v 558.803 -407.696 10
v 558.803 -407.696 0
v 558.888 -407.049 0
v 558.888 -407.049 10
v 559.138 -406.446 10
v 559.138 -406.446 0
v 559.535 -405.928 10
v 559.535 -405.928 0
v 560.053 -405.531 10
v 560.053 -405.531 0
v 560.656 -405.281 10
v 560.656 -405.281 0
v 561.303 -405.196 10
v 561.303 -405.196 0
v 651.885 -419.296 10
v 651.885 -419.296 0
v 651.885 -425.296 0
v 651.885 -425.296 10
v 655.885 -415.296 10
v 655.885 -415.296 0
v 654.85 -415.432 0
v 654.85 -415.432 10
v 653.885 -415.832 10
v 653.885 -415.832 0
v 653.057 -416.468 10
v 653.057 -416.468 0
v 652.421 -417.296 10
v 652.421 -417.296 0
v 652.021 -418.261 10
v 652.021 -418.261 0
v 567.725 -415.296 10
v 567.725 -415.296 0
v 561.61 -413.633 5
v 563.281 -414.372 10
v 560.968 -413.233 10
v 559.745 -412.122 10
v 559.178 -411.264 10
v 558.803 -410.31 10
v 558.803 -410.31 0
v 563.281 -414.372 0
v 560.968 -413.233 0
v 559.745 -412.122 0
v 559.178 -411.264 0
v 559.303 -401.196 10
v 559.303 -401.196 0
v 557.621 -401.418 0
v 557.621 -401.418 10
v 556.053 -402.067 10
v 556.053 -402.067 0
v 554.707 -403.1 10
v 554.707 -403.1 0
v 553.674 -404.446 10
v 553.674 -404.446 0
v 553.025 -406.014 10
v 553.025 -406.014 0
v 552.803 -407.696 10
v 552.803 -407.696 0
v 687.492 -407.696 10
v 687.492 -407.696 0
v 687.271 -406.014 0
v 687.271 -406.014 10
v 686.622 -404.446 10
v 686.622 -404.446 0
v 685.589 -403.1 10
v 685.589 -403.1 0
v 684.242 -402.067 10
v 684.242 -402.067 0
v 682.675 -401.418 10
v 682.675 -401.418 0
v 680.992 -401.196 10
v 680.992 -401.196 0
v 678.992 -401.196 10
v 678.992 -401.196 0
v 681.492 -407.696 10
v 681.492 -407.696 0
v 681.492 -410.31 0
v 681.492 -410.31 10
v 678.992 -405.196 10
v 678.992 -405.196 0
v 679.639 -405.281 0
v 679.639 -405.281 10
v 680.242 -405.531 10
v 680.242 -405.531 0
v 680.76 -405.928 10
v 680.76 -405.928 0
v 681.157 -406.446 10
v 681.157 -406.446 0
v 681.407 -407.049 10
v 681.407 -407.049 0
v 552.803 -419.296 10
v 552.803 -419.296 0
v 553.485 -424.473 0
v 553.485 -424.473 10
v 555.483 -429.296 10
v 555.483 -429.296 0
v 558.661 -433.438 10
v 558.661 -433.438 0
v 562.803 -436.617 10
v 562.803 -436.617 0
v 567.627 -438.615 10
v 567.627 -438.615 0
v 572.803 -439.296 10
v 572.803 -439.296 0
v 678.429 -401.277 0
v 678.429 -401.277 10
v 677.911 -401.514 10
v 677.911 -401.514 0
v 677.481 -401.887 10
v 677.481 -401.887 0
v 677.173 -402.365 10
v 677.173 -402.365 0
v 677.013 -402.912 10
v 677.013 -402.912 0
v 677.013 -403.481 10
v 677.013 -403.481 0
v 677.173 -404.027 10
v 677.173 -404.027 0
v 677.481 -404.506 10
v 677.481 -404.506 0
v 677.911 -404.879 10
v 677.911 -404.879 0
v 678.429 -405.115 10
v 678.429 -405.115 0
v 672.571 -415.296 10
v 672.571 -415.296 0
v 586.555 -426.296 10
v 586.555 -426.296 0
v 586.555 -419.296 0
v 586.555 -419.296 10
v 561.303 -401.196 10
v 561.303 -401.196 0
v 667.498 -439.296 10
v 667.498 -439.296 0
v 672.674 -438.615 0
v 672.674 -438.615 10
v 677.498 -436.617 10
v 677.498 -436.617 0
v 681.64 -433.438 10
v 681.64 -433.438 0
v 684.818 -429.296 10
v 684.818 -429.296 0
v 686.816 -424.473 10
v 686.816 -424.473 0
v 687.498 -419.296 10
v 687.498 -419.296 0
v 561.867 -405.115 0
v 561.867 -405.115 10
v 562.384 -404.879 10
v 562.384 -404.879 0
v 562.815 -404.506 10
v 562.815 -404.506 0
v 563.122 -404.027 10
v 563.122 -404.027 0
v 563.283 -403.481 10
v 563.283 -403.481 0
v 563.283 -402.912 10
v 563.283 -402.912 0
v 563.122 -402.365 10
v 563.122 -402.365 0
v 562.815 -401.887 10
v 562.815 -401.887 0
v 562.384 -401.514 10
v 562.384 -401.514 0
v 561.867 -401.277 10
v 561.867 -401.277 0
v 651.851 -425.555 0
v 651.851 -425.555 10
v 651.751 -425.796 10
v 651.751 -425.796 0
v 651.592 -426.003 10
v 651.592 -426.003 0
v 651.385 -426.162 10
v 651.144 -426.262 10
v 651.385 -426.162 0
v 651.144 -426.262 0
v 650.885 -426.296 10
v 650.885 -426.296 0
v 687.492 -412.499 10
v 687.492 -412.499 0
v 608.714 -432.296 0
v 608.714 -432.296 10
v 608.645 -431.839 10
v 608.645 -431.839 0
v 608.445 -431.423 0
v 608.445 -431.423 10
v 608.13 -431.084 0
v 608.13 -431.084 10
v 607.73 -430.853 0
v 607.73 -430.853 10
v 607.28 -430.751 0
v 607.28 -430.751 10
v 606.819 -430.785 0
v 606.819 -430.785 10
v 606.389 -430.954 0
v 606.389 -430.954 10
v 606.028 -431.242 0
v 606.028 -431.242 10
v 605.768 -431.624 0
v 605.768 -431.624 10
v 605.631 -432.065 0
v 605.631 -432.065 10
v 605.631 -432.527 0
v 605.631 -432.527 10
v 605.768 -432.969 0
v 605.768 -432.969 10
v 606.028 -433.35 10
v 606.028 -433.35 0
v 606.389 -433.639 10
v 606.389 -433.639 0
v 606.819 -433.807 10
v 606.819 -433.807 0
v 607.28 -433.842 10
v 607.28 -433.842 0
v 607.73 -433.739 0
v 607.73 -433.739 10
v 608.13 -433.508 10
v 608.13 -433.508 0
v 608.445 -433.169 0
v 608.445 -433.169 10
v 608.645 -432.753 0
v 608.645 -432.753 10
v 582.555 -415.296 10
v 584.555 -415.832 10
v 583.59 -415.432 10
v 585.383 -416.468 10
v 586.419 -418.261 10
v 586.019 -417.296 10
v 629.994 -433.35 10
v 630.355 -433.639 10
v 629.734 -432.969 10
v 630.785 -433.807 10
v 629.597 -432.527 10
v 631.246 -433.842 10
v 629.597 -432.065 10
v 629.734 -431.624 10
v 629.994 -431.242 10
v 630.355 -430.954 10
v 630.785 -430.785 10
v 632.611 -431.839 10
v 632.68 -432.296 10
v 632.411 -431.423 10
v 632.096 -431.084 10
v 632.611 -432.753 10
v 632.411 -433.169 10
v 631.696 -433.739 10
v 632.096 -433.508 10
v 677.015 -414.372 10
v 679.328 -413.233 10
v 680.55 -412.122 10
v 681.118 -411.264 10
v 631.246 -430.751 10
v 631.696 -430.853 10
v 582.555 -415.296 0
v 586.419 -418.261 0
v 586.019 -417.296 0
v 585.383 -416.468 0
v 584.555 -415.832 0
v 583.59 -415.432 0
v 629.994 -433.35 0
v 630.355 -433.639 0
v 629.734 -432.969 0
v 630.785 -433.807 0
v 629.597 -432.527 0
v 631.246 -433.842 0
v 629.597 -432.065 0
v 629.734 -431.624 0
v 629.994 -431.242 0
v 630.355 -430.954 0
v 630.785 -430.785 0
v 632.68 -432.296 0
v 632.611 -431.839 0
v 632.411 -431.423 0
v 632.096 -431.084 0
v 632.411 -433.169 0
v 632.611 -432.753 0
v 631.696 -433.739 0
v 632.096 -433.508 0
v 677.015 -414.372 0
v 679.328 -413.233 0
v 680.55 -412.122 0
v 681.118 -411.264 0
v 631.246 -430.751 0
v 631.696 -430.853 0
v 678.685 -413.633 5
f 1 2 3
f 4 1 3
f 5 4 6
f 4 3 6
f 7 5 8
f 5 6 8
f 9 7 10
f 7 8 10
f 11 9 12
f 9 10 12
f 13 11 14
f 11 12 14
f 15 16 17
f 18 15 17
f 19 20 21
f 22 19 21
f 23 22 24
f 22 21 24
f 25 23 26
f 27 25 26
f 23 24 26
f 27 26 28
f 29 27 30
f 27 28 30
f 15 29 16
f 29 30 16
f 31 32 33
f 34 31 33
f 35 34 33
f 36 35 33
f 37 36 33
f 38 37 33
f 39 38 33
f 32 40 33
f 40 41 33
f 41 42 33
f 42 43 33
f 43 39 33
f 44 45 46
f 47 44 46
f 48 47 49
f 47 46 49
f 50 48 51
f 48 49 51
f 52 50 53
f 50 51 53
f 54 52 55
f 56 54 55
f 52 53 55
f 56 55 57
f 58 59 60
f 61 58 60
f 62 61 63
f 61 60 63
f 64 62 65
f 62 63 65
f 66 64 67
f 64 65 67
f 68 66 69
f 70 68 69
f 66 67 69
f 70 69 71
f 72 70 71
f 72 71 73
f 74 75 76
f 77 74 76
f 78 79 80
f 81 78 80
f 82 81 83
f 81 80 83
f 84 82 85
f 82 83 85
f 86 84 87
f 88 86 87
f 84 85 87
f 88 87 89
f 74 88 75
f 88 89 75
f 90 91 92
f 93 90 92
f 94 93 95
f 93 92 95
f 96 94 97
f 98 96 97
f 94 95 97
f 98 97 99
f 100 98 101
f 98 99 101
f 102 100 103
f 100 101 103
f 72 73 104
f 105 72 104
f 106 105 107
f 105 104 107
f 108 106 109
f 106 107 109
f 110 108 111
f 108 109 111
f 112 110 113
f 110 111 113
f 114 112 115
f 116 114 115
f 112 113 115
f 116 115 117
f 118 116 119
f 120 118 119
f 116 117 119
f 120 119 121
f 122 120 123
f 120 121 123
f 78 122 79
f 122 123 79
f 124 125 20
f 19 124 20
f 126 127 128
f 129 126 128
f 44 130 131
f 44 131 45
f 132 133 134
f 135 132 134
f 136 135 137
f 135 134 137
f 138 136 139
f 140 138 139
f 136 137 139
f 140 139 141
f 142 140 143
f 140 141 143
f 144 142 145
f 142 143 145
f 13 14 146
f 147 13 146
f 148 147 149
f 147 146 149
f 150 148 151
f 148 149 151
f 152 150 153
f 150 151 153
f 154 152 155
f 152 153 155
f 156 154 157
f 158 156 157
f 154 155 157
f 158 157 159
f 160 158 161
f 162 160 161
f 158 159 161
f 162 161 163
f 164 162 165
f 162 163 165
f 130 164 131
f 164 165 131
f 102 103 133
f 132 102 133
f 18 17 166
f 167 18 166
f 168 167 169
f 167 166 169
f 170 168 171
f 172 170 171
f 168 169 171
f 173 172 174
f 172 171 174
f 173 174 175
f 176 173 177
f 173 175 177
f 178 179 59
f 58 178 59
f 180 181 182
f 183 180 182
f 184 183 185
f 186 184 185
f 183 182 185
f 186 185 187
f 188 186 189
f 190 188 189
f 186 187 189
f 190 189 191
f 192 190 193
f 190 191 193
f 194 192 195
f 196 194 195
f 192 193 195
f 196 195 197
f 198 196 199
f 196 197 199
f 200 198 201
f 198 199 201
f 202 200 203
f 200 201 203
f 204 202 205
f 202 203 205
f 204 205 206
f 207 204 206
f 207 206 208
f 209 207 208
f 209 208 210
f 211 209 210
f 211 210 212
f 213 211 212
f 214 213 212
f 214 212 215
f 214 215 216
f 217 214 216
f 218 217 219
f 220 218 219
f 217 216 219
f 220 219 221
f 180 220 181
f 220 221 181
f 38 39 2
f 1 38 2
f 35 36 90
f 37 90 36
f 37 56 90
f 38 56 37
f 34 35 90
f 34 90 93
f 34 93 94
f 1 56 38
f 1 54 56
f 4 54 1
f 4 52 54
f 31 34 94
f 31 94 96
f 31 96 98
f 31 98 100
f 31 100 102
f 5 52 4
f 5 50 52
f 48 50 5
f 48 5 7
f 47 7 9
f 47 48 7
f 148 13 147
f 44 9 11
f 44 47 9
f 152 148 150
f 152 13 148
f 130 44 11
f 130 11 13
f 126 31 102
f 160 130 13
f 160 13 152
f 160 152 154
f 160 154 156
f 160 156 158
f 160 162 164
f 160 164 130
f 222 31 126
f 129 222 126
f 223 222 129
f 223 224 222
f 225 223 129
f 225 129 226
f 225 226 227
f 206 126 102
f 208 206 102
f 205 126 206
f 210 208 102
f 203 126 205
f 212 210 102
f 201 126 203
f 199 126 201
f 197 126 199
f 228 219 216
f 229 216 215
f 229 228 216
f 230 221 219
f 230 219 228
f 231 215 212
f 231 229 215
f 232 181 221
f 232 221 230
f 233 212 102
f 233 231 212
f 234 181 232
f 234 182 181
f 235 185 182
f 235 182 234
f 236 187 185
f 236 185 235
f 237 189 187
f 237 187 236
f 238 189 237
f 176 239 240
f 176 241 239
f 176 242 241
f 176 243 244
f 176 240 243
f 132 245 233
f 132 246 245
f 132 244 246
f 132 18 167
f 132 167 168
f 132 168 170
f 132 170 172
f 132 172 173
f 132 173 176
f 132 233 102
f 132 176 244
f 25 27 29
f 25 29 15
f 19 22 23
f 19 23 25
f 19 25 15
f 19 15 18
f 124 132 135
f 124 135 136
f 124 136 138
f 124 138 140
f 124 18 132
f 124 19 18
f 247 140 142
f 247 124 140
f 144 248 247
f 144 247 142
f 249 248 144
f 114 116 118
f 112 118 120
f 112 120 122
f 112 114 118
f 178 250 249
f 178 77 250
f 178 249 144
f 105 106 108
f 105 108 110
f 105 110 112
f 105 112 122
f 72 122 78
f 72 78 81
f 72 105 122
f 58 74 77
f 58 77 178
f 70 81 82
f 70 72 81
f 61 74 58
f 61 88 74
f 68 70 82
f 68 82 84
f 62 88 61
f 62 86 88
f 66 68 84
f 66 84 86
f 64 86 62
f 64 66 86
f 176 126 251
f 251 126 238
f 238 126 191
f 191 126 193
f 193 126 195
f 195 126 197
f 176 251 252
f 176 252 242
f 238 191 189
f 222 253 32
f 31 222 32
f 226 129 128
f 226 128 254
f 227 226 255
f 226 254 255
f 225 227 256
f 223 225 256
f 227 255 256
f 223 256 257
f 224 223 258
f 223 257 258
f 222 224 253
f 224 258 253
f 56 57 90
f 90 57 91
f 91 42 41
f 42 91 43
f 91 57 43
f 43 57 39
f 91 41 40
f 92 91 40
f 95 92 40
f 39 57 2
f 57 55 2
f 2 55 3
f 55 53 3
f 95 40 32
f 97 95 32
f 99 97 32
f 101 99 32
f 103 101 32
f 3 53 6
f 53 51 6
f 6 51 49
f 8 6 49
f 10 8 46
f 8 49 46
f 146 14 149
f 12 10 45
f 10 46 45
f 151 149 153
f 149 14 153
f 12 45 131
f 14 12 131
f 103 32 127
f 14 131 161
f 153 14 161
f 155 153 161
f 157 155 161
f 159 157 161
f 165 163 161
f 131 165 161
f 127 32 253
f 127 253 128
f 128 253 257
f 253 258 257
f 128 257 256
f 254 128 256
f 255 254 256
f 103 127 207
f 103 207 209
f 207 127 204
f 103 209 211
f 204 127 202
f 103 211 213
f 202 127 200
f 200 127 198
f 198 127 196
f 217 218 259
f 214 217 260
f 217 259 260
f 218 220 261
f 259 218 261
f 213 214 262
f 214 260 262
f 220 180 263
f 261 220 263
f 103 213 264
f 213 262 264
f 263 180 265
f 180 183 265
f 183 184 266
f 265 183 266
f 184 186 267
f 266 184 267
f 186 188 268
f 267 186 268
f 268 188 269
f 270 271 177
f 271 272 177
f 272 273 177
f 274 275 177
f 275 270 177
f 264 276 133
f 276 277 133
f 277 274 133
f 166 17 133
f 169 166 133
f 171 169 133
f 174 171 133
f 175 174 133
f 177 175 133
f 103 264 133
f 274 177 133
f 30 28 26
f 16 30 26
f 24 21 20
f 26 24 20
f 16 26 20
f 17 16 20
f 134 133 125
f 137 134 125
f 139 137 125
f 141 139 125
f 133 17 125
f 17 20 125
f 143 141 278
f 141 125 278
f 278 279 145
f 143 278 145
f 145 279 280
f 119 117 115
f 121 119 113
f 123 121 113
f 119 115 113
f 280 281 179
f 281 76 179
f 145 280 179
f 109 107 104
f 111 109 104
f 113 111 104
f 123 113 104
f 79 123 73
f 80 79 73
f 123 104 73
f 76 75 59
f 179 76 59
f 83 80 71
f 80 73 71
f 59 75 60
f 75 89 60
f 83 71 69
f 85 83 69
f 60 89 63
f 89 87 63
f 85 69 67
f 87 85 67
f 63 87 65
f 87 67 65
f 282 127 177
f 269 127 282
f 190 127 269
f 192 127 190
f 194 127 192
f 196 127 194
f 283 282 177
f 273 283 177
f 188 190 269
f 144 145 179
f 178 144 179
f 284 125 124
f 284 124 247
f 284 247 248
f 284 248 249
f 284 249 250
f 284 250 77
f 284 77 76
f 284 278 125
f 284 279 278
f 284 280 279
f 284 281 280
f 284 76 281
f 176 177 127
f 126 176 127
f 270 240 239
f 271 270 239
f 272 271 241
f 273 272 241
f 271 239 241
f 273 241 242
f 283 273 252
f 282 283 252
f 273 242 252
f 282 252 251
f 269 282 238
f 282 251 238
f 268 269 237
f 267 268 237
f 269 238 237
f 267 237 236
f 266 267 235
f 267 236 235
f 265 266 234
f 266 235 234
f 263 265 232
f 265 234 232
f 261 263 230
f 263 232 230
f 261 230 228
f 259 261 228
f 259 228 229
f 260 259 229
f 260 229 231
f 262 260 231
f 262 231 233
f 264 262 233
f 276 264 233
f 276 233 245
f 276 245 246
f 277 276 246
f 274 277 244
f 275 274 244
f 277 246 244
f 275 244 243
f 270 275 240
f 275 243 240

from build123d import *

# Parameters (mm, degrees)
DODANIE_WYCI_GNI_CIE1_DEPTH = 10
SZKIC2_R                    = 1.55
WYTNIJ_WYCI_GNI_CIE1_DEPTH  = 10


with BuildPart() as part:
    # Szkic1 → Dodanie-wyciągnięcie1 (new body)
    with BuildSketch(Plane.XY):
        with BuildLine():
            Line((650.135201584, -439.296174139), (667.497764869, -439.296174139))
            ThreePointArc((667.497764869, -439.296174139), (681.639900492, -433.438309763), (687.497764869, -419.296174139))
            Line((687.497764869, -419.296174139), (687.49242436, -412.499258381))
            Line((687.49242436, -412.499258381), (687.49242436, -407.696233576))
            ThreePointArc((687.49242436, -407.696233576), (685.588618438, -403.100039498), (680.99242436, -401.196233576))
            Line((680.99242436, -401.196233576), (678.99242436, -401.196233576))
            ThreePointArc((678.99242436, -401.196233576), (676.99242436, -403.196233576), (678.99242436, -405.196233576))
            ThreePointArc((678.99242436, -405.196233576), (680.760191313, -405.928466623), (681.49242436, -407.696233576))
            Line((681.49242436, -407.696233576), (681.49242436, -410.309613134))
            add(Edge.make_bspline(
                [(672.570535689, -415.296173961), (680.339252513, -414.463379514), (681.49242436, -410.309613134)],
                knots=[0, 0, 0, 0.645201515, 0.645201515, 0.645201515], degree=2))
            Line((672.570535689, -415.296173961), (655.885201584, -415.296173961))
            ThreePointArc((655.885201584, -415.296173961), (653.056774459, -416.467746836), (651.885201584, -419.296173961))
            Line((651.885201584, -419.296173961), (651.885201584, -425.296174139))
            ThreePointArc((651.885201584, -425.296174139), (651.592308365, -426.00328092), (650.885201584, -426.296174139))
            Line((650.885201584, -426.296174139), (647.885201584, -426.296174139))
            Line((647.885201584, -426.296174139), (586.55506807, -426.296174139))
            Line((586.55506807, -426.296174139), (586.55506807, -419.296173961))
            ThreePointArc((586.55506807, -419.296173961), (585.383495195, -416.467746836), (582.55506807, -415.296173961))
            Line((582.55506807, -415.296173961), (567.724994048, -415.296173961))
            add(Edge.make_bspline(
                [(567.724994048, -415.296173961), (559.956277225, -414.463379514), (558.803105378, -410.309613134)],
                knots=[0, 0, 0, 0.645201515, 0.645201515, 0.645201515], degree=2))
            Line((558.803105378, -410.309613134), (558.803105378, -407.696233576))
            ThreePointArc((558.803105378, -407.696233576), (559.535338425, -405.928466623), (561.303105378, -405.196233576))
            ThreePointArc((561.303105378, -405.196233576), (563.303105378, -403.196233576), (561.303105378, -401.196233576))
            Line((561.303105378, -401.196233576), (559.303105378, -401.196233576))
            ThreePointArc((559.303105378, -401.196233576), (554.7069113, -403.100039498), (552.803105378, -407.696233576))
            Line((552.803105378, -407.696233576), (552.803105378, -412.499258381))
            Line((552.803105378, -412.499258381), (552.803105378, -419.296174139))
            ThreePointArc((552.803105378, -419.296174139), (558.660969754, -433.438309763), (572.803105378, -439.296174139))
            Line((572.803105378, -439.296174139), (588.30506807, -439.296174139))
            Line((588.30506807, -439.296174139), (650.135201584, -439.296174139))
        make_face()
    extrude(amount=DODANIE_WYCI_GNI_CIE1_DEPTH)

    # Szkic2 → Wytnij-wyciągnięcie1 (cut)
    with BuildSketch(Plane.XY.offset(10)):
        with Locations((631.130089997, -432.296174368)):
            Circle(SZKIC2_R)
        with Locations((607.164083377, -432.296174368)):
            Circle(SZKIC2_R)
    extrude(amount=-WYTNIJ_WYCI_GNI_CIE1_DEPTH, mode=Mode.SUBTRACT)


solid = part.part
